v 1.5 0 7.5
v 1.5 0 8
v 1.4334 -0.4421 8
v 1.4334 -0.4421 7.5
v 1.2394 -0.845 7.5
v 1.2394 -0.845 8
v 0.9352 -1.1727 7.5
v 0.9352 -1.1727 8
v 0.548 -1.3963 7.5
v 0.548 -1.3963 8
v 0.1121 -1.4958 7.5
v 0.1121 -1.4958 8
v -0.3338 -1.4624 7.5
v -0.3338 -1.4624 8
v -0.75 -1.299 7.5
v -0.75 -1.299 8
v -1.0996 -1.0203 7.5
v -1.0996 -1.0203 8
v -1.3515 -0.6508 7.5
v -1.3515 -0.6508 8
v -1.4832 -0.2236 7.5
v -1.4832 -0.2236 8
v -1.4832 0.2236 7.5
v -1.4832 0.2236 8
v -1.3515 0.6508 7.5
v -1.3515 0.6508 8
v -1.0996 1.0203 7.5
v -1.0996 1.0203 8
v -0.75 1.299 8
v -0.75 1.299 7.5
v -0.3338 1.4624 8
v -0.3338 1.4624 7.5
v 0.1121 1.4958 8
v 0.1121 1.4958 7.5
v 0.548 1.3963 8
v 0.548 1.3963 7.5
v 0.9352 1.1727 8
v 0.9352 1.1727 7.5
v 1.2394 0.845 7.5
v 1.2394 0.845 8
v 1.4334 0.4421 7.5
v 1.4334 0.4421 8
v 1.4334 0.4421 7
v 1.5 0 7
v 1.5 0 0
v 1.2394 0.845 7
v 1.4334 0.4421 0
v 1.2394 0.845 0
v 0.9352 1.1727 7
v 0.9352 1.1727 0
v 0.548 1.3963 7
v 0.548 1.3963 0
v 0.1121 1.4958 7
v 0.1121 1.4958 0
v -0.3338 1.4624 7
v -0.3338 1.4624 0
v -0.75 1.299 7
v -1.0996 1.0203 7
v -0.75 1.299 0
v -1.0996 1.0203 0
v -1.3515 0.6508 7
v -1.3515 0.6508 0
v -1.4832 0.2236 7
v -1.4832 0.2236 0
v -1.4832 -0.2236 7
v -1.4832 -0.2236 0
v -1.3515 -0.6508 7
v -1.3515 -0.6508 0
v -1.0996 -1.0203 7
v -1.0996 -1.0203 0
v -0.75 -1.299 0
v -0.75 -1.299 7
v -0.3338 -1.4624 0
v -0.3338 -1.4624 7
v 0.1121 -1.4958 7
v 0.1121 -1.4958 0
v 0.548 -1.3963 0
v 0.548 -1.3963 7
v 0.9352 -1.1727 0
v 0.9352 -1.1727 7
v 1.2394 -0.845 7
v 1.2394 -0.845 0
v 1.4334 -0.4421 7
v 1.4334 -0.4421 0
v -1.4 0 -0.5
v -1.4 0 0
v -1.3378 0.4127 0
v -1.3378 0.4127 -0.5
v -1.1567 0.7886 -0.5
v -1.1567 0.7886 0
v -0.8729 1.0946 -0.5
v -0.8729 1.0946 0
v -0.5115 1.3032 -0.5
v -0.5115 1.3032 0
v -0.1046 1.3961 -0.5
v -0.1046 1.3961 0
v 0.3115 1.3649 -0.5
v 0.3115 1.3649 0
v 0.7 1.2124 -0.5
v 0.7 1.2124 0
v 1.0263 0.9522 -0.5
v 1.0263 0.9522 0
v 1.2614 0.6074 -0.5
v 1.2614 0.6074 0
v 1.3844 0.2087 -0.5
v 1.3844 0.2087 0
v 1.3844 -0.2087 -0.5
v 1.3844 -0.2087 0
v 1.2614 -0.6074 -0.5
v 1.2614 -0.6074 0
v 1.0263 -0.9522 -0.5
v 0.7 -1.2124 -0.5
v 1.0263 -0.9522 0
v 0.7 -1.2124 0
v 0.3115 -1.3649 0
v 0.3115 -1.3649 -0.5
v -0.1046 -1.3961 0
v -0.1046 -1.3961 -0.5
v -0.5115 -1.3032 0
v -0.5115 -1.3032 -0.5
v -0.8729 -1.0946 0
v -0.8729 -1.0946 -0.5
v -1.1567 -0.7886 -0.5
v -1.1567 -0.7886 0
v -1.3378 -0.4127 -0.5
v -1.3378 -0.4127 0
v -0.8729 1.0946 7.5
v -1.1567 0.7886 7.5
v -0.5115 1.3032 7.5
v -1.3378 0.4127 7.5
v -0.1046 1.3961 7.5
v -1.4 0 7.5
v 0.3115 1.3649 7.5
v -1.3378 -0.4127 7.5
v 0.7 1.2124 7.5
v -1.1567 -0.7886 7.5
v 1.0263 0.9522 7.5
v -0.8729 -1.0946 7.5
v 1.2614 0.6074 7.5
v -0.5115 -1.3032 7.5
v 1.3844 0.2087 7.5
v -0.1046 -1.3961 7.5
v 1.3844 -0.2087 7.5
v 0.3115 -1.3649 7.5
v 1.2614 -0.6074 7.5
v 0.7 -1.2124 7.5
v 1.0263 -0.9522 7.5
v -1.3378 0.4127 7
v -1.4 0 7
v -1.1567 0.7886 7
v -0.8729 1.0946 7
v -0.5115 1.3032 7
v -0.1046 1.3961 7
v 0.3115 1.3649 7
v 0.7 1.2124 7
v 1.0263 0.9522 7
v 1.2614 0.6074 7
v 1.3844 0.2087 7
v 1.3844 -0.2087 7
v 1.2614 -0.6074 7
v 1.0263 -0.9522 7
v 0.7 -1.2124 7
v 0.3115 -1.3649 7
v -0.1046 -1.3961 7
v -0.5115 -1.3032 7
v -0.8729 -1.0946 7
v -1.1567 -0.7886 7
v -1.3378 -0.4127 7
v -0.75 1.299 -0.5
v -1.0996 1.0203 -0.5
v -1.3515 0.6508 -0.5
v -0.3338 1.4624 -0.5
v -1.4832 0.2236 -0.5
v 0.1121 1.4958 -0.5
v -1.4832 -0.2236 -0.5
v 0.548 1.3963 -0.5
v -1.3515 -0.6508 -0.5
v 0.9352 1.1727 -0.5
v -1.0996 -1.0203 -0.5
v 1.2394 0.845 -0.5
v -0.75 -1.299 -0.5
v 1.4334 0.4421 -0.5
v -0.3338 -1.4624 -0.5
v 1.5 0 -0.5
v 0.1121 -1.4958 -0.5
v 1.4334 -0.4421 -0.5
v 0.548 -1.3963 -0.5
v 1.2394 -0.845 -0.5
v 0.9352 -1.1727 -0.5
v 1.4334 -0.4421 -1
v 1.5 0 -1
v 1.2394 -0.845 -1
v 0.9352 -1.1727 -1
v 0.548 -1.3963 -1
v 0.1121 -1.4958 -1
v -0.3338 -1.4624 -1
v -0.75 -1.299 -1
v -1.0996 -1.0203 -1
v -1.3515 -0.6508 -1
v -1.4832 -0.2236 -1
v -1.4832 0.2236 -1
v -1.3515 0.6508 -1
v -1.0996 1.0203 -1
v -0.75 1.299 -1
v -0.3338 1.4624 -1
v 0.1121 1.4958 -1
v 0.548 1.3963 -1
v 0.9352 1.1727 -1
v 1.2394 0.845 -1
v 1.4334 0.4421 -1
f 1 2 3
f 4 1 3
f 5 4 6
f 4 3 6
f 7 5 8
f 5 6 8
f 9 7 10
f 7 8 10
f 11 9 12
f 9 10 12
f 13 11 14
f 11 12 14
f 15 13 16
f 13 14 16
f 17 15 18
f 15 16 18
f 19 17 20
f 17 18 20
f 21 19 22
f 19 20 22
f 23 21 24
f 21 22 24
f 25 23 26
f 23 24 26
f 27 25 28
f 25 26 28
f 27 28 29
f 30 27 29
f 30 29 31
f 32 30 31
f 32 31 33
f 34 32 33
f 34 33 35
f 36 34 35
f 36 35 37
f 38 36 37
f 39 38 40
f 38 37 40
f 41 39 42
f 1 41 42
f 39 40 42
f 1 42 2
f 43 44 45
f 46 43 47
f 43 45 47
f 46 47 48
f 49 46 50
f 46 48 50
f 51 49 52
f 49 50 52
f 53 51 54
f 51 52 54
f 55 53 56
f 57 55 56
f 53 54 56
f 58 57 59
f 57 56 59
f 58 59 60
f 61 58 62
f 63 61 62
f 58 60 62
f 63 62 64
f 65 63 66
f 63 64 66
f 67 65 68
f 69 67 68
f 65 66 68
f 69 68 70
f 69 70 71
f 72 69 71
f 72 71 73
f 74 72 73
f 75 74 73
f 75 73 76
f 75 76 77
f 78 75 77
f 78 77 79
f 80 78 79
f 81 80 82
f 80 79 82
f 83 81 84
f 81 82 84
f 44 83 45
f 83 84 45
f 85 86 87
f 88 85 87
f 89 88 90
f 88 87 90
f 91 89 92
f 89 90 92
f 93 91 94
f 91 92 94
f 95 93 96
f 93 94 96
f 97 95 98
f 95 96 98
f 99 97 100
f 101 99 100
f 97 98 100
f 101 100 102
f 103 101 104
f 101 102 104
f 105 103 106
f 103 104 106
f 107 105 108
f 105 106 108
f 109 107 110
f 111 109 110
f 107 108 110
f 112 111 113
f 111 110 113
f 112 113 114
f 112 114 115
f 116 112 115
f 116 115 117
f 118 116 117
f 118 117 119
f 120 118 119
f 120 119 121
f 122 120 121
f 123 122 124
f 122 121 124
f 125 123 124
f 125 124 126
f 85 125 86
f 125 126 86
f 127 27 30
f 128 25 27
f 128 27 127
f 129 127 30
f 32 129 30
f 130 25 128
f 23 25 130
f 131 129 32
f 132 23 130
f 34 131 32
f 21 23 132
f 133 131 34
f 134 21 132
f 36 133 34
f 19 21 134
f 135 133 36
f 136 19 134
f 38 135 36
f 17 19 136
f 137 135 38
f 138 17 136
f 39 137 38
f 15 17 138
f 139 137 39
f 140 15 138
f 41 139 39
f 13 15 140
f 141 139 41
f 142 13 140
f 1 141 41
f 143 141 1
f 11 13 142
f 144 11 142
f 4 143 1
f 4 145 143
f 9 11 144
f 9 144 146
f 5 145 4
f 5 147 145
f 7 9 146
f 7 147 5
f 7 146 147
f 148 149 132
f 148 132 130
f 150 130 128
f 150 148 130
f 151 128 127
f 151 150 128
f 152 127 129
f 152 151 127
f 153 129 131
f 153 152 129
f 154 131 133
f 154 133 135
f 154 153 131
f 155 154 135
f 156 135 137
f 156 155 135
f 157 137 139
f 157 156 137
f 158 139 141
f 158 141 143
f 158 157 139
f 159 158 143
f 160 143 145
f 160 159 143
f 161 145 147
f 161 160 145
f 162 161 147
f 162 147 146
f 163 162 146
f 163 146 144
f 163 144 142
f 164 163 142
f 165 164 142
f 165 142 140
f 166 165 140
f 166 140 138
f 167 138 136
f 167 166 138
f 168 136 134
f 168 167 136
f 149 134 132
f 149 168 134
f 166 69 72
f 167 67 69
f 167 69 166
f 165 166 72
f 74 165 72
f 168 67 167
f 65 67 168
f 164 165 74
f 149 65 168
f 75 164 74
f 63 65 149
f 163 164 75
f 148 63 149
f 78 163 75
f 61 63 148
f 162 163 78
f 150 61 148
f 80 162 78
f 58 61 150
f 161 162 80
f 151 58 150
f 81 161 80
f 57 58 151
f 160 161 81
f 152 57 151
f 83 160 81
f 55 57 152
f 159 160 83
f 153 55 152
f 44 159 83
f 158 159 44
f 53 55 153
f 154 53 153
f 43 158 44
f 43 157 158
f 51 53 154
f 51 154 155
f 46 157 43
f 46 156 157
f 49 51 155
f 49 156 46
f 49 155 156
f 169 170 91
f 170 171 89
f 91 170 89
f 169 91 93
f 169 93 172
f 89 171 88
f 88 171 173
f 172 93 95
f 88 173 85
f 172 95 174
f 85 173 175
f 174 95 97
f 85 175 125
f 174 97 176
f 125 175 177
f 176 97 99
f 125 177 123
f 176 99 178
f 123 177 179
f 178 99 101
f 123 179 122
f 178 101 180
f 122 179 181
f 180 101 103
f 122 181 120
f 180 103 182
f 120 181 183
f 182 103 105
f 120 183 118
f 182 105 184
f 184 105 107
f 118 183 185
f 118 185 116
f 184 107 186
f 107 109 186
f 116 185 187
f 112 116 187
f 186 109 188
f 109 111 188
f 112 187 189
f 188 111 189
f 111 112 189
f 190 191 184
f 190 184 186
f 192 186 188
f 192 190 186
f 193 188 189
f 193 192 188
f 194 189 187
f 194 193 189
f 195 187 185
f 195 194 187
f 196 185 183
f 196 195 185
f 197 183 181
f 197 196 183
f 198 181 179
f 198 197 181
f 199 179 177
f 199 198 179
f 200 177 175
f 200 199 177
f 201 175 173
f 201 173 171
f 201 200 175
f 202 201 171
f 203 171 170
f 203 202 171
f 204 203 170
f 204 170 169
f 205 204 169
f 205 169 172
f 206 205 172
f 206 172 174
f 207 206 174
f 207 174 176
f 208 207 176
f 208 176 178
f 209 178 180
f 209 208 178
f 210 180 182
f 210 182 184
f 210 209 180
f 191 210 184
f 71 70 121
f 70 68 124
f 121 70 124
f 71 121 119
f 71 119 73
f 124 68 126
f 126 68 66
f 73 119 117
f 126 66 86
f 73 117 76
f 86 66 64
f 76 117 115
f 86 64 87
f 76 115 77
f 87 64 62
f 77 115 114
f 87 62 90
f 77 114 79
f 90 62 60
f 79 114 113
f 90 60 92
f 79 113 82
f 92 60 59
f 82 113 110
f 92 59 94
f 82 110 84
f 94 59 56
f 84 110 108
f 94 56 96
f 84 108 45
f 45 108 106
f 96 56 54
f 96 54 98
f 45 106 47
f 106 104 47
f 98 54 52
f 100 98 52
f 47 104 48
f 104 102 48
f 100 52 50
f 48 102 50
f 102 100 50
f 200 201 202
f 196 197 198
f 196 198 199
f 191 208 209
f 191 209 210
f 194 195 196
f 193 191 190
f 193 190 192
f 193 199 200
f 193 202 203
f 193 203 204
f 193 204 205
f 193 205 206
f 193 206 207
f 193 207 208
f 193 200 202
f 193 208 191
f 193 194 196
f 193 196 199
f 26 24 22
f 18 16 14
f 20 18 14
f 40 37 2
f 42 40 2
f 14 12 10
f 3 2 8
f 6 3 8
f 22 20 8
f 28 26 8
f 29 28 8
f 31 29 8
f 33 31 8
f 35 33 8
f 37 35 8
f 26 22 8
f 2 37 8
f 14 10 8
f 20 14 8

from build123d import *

# Parameters (mm, degrees)
SKETCH1_R           = 1.5
BOSS_EXTRUDE1_DEPTH = 7
SKETCH2_R           = 1.4
BOSS_EXTRUDE2_DEPTH = 0.5
BOSS_EXTRUDE3_START = 0.5
SKETCH3_R           = 1.5
BOSS_EXTRUDE3_DEPTH = 0.5


with BuildPart() as part:
    # Sketch1 → Boss-Extrude1 (new body)
    with BuildSketch(Plane.XY):
        Circle(SKETCH1_R)
    extrude(amount=BOSS_EXTRUDE1_DEPTH)

    # Sketch2 → Boss-Extrude2 (add)
    with BuildSketch(Plane(origin=(0, 0, 0), x_dir=(-1, 0, 0), z_dir=(0, 0, -1))):
        Circle(SKETCH2_R)
    boss_extrude2 = extrude(amount=BOSS_EXTRUDE2_DEPTH)

    # Sketch3 → Boss-Extrude3 (add)
    with BuildSketch(Plane(origin=(0, 0, -0.5), x_dir=(-1, 0, 0), z_dir=(0, 0, -1)).offset(BOSS_EXTRUDE3_START)):
        with Locations(Location((0, 0, 0), (0, 0, 180))):
            Circle(SKETCH3_R)
    boss_extrude3 = extrude(amount=-BOSS_EXTRUDE3_DEPTH)

    # Mirror1: Boss-Extrude2, Boss-Extrude3 across plane
    add(boss_extrude2.mirror(Plane.XY.offset(3.5)))
    add(boss_extrude3.mirror(Plane.XY.offset(3.5)))


solid = part.part
